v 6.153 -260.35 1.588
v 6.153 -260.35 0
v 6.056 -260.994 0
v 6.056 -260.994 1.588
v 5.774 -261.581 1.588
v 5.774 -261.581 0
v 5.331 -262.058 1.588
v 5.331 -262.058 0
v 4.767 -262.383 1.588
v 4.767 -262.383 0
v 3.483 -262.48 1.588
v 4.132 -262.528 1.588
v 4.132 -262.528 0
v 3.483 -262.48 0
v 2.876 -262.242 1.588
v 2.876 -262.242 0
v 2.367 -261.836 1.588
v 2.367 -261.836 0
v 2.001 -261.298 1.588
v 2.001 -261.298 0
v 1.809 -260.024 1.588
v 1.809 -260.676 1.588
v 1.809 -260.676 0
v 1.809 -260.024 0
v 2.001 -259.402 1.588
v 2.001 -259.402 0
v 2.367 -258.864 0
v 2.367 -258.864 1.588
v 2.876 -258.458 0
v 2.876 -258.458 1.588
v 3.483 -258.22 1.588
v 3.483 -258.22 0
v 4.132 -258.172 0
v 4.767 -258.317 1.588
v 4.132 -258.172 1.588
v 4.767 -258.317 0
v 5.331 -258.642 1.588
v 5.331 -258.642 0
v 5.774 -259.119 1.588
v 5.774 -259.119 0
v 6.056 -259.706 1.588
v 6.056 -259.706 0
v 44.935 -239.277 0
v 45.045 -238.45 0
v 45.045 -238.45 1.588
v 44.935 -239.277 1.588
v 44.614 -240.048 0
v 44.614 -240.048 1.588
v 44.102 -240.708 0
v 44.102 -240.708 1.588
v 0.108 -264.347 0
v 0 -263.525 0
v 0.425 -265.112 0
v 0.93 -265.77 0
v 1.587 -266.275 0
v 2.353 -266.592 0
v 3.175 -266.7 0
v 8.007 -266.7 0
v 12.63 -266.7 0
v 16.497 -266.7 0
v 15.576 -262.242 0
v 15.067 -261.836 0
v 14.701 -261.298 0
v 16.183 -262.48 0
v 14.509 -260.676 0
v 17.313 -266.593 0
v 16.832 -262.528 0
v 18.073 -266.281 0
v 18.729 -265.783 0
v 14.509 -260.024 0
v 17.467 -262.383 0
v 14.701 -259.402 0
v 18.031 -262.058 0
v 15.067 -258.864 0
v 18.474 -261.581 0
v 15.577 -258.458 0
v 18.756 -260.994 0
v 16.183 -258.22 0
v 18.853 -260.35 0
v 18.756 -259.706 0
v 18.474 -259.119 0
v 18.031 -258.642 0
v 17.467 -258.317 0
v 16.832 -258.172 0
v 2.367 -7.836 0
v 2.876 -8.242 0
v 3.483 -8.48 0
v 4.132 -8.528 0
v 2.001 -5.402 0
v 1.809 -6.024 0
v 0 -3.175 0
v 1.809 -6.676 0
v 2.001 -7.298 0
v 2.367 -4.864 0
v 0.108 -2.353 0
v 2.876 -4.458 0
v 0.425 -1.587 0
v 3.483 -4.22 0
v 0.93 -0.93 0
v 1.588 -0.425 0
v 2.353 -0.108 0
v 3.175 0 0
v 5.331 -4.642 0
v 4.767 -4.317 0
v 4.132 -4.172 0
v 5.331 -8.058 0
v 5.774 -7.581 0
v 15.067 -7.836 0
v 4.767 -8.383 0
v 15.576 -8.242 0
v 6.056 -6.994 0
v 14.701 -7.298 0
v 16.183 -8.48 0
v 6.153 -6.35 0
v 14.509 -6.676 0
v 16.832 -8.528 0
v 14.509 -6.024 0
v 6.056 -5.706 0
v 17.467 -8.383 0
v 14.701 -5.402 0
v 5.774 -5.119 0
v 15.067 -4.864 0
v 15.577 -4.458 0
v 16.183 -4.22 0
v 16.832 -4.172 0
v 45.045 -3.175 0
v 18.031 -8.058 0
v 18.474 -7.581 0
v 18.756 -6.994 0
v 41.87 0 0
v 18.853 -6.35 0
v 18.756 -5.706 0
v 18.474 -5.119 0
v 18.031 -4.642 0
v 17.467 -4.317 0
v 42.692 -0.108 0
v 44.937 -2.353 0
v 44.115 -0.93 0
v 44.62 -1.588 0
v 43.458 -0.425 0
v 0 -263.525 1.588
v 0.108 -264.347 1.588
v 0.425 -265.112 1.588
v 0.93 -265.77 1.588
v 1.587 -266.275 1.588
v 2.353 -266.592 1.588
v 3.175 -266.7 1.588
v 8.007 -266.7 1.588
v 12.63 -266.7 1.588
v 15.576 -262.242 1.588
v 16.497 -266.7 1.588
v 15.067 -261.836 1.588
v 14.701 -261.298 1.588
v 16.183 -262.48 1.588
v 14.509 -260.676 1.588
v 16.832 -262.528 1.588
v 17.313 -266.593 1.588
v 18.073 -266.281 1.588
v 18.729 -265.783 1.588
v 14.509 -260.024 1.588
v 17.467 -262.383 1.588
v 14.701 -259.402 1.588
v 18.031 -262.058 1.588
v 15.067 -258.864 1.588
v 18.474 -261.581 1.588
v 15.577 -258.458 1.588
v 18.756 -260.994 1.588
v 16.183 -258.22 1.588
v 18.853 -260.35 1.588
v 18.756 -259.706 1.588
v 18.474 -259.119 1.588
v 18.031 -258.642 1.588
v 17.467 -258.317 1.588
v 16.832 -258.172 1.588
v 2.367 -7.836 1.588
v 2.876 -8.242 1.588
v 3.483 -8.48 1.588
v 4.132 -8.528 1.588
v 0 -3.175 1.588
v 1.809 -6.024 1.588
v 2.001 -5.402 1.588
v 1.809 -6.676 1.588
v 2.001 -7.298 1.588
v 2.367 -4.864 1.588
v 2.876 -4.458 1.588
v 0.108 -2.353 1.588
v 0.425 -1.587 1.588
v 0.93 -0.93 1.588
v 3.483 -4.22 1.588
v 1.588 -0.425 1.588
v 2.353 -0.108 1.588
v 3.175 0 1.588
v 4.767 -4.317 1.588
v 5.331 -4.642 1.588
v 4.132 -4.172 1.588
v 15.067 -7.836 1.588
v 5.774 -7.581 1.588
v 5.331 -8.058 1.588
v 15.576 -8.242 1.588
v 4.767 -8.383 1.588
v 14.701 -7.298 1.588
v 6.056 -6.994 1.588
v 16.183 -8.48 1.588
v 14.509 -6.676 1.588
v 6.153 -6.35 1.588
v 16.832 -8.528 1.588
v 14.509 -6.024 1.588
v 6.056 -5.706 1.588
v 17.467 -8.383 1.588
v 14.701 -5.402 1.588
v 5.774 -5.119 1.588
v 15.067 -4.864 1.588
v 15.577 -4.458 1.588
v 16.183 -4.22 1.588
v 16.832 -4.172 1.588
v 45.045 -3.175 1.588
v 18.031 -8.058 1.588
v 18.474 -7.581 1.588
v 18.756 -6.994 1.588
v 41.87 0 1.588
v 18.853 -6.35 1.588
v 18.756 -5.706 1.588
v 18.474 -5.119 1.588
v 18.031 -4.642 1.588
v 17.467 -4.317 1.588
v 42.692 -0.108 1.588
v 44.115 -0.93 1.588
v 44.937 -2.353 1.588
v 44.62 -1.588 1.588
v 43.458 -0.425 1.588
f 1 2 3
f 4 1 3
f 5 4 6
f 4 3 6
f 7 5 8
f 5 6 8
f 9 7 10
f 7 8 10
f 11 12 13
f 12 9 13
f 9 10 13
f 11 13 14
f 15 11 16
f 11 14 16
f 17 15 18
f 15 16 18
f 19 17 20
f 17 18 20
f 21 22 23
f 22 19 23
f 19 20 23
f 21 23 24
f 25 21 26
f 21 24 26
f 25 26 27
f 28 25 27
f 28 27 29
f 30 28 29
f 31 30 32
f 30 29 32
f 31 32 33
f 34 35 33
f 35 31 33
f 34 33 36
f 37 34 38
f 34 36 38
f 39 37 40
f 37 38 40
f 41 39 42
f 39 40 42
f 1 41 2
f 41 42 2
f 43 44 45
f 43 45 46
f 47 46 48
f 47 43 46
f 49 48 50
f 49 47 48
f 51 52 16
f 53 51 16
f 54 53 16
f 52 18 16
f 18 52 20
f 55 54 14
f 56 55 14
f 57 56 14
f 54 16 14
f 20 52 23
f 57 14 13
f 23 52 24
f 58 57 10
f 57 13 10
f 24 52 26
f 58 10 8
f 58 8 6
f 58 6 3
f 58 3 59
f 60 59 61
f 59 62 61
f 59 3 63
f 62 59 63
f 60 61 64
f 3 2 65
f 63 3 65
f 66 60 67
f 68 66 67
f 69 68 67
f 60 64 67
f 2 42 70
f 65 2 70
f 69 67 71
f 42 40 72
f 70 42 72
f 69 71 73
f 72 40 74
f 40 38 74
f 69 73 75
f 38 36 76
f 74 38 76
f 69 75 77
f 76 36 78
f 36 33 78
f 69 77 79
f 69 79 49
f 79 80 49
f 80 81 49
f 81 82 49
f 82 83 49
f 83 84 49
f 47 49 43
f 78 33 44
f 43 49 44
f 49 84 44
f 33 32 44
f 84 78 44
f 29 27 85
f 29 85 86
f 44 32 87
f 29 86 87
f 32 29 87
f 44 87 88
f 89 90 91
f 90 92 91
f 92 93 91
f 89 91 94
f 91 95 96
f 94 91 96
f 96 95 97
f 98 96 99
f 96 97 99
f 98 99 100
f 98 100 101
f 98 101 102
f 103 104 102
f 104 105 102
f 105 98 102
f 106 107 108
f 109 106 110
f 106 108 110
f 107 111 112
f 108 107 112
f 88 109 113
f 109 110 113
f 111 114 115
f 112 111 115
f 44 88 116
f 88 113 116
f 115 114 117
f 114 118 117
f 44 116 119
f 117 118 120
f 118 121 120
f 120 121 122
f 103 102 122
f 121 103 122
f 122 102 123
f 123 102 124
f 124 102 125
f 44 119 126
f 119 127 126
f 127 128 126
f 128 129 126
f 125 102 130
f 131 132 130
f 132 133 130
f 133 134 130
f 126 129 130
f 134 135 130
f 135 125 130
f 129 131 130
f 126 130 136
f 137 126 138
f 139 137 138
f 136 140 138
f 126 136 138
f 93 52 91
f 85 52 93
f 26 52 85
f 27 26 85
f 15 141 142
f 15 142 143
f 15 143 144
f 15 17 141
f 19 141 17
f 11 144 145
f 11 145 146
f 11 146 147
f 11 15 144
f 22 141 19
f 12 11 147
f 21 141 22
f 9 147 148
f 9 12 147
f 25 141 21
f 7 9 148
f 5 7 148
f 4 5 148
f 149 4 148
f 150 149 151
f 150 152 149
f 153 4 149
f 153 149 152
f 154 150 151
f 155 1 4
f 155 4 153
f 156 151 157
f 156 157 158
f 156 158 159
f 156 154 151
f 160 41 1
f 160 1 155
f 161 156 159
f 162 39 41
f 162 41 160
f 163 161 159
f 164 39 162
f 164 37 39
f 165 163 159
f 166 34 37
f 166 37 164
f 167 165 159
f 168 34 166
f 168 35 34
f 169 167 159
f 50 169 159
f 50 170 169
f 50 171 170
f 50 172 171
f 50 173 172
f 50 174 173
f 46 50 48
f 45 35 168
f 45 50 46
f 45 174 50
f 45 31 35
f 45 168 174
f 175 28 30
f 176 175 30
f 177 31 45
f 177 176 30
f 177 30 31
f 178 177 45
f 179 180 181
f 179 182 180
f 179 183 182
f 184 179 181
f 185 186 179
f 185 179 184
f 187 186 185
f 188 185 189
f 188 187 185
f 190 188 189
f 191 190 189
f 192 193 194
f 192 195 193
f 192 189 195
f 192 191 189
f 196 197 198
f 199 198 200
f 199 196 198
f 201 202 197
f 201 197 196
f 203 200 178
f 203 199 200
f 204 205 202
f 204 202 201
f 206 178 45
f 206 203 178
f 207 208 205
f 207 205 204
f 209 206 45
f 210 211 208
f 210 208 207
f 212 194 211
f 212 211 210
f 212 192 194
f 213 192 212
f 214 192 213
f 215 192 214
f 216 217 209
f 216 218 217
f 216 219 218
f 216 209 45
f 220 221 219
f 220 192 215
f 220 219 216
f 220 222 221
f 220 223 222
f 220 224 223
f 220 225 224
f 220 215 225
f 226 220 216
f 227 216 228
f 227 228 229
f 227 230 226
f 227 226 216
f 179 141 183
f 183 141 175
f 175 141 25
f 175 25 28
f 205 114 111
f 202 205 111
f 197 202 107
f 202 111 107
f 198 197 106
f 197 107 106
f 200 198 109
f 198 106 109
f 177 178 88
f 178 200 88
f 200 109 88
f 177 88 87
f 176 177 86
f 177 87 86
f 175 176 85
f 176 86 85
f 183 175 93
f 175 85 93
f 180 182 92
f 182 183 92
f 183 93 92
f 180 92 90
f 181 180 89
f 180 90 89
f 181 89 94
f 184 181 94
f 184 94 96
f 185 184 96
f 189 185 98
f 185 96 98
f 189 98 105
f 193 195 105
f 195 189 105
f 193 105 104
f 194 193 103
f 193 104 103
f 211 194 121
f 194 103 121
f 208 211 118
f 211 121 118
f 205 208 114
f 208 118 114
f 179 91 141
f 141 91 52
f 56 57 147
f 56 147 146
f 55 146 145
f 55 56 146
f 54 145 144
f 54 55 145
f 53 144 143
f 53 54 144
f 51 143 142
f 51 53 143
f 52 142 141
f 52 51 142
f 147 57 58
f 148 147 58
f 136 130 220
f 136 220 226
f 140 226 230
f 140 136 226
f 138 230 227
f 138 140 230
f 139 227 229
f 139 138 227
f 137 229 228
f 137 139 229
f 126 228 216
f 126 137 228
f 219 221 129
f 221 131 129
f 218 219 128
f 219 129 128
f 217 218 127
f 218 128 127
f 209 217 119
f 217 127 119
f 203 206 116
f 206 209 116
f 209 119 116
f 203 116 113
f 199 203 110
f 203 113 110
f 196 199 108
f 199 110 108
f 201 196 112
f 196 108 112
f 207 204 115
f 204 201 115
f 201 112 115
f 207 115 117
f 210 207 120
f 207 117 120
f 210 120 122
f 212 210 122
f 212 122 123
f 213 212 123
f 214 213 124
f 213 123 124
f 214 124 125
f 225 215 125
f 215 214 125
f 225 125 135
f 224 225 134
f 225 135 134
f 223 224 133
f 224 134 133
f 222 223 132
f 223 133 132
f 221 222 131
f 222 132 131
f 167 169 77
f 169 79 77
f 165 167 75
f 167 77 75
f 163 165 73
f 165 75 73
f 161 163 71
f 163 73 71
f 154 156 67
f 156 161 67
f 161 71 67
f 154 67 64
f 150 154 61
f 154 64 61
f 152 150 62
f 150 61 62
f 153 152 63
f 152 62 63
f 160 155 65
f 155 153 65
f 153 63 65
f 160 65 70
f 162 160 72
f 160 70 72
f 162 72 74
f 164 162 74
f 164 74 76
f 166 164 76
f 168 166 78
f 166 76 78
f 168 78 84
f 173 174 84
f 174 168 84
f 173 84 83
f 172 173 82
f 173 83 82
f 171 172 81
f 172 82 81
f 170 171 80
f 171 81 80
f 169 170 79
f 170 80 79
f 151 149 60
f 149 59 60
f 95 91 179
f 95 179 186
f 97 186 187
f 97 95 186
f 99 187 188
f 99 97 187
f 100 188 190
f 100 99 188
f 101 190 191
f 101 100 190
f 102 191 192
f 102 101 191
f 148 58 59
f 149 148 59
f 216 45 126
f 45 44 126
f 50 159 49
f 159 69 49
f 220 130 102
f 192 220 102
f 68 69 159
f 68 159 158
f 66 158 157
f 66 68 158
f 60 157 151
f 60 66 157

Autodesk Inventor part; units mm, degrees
ref_plane "YZ Plane" through (0, 0, 0) normal (1, 0, 0) x (0, 1, 0)
ref_plane "XZ Plane" through (0, 0, 0) normal (0, 1, 0) x (-1, 0, 0)
ref_plane "XY Plane" through (0, 0, 0) normal (0, 0, 1) x (1, 0, 0)
sketch "Sketch1" plane through (0, 0, 0) normal (0, 0, 1) x (1, 0, 0)
  circle A0 centre (3.9687, -260.35) radius 2.1844
  circle A1 centre (16.6687, -260.35) radius 2.1844
  circle A2 centre (3.9687, -6.35) radius 2.1844
  circle A3 centre (16.6687, -6.35) radius 2.1844
  line L0 (3.175, -266.7) -> (8.0073, -266.7)
  line L1 (12.6301, -266.7) -> (16.4968, -266.7)
  line L2 (41.8702, 0) -> (3.175, 0)
  line L3 (3.175, -266.7) -> (16.4968, -266.7)
  line L4 (45.0452, -238.4496) -> (45.0452, -3.175)
  line L5 (41.8702, 0) -> (3.175, 0)
  line L6 (0, -3.175) -> (0, -263.525)
  circle A4 centre (3.9687, -260.35) radius 2.1844
  circle A5 centre (16.6687, -260.35) radius 2.1844
  circle A6 centre (3.9687, -6.35) radius 2.1844
  circle A7 centre (16.6687, -6.35) radius 2.1844
  arc A8 (0, -263.525) -> (3.175, -266.7) centre (3.175, -263.525) ccw
  arc A9 (3.175, 0) -> (0, -3.175) centre (3.175, -3.175) ccw
  arc A10 (45.0452, -3.175) -> (41.8702, 0) centre (41.8702, -3.175) ccw
  line L7 (18.7286, -265.7833) -> (44.1019, -240.7079)
  arc A11 (16.4968, -266.7) -> (18.7286, -265.7833) centre (16.4968, -263.525) ccw
  arc A12 (44.1019, -240.7079) -> (45.0452, -238.4496) centre (41.8702, -238.4496) ccw
  point P0 (0, 0)
  point P1 (18.3752, -266.7)
  point P2 (19.0379, -265.4777)
  point P3 (21.2768, -266.7)
  point P4 (45.0452, -243.1716)
  point P5 (43.8497, -240.9572)
  dimension "d5" = 3.175
extrude "Extrusion1" add sketch "Sketch1" along normal blind 1.5875
properties part number "wingplexi"
